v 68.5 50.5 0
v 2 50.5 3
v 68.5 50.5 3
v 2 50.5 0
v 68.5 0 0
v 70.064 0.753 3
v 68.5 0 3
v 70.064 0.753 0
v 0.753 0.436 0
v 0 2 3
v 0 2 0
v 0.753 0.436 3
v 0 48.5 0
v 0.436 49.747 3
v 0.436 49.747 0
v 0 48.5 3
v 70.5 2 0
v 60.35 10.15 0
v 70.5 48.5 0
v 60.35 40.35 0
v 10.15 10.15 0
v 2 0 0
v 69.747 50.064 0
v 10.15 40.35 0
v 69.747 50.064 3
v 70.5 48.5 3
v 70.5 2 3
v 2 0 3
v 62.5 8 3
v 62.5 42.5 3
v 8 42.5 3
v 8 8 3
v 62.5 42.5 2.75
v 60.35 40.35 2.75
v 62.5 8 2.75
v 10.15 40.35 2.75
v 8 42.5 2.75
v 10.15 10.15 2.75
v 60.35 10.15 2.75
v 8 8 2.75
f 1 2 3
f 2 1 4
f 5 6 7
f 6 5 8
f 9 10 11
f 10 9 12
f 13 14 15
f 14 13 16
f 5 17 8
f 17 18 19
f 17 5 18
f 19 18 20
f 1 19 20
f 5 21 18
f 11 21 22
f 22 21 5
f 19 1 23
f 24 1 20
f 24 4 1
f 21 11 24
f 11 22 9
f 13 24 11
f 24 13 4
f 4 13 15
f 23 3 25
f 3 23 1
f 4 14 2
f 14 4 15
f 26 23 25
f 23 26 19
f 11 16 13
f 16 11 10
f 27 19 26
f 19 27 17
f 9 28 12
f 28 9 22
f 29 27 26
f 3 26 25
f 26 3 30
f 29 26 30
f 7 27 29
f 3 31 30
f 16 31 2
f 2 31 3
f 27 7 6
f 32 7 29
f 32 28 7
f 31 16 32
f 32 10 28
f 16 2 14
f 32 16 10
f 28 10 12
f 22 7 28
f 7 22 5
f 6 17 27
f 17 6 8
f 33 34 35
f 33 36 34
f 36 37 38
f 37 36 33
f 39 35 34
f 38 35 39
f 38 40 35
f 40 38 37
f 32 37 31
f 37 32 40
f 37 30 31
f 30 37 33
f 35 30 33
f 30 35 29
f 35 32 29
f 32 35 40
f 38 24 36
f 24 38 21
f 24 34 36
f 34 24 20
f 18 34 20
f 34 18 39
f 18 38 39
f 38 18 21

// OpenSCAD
//
// PCB + Solder Stencil Mount
//
// Coordinate system:
//   X = width
//   Y = height
//   Z = height
//
// The PCB sits in a recessed pocket.
// The stencil sits above the PCB and is constrained by the outer frame.
//

// ============================================================
// PCB DIMENSIONS
// ============================================================

pcb_width  = 50.0;       // PCB X dimension
pcb_height = 30.0;       // PCB Y dimension
pcb_thickness = 1.6;


// ============================================================
// STENCIL DIMENSIONS
// ============================================================

// Actual stencil dimensions
stencil_width  = 54.0;
stencil_height = 34.0;
stencil_thickness = 0.15;


// ============================================================
// PCB POSITION RELATIVE TO STENCIL
// ============================================================

// Positive values move the PCB relative to the stencil.
//
// Example:
//   pcb_offset_x = 0
//   pcb_offset_y = 0
//
// centers the PCB inside the stencil.
//
// These are particularly useful if the stencil is intentionally
// larger than the PCB.

pcb_offset_x = 0.0;
pcb_offset_y = 0.0;


// ============================================================
// STENCIL CLEARANCE
// ============================================================

// Clearance between stencil and the inside of the retaining
// frame.
//
// Smaller = tighter stencil fit.
// Larger = easier insertion/removal.

stencil_clearance_x = 0.25;
stencil_clearance_y = 0.25;


// ============================================================
// FRAME
// ============================================================

// Width of material surrounding the stencil.

frame_border = 8.0;


// ============================================================
// PCB POCKET CLEARANCE
// ============================================================

// Clearance around PCB.
//
// Keep this small enough that the PCB cannot move significantly,
// but large enough for easy insertion.

pcb_clearance_x = 0.10;
pcb_clearance_y = 0.10;


// ============================================================
// Z HEIGHTS
// ============================================================

// Thickness of the mounting plate.

base_thickness = 3.0;


// Depth of PCB pocket measured from the top surface.
//
// For example, with a 3 mm base and a 1.6 mm PCB:
// pcb_pocket_depth = 1.8 means the PCB top is 1.2 mm
// below the top surface.

pcb_pocket_depth = 1.8;


// Depth of the stencil recess.
//
// This should normally be approximately equal to the stencil
// thickness, or slightly deeper.

stencil_pocket_depth = 0.25;


// ============================================================
// OPTIONAL PCB SUPPORT
// ============================================================

// Extra material underneath PCB.
//
// This effectively determines how deep the PCB sits.

pcb_bottom_support = 0.5;


// ============================================================
// CORNER / EDGE OPTIONS
// ============================================================

// Radius of outer frame corners.
// Set to 0 for square corners.

outer_corner_radius = 2;


// Radius of PCB pocket corners.
// Usually 0 is preferable for rectangular PCBs.

pcb_corner_radius = 0;


// ============================================================
// CALCULATED DIMENSIONS
// ============================================================

// Stencil opening/frame size
stencil_outer_width =
    stencil_width + 2 * stencil_clearance_x;

stencil_outer_height =
    stencil_height + 2 * stencil_clearance_y;


// Overall mount size
mount_width =
    stencil_outer_width + 2 * frame_border;

mount_height =
    stencil_outer_height + 2 * frame_border;


// PCB pocket dimensions
pcb_pocket_width =
    pcb_width + 2 * pcb_clearance_x;

pcb_pocket_height =
    pcb_height + 2 * pcb_clearance_y;


// PCB position in mount
//
// First center the stencil in the mount,
// then offset the PCB relative to the stencil.

pcb_center_x =
    mount_width / 2
    + pcb_offset_x;

pcb_center_y =
    mount_height / 2
    + pcb_offset_y;


// ============================================================
// HELPER: ROUNDED RECTANGLE
// ============================================================

module rounded_rectangle(width, height, radius) {

    if (radius <= 0) {
        square([width, height], center=true);
    }
    else {
        offset(r=radius)
            square([
                width - 2 * radius,
                height - 2 * radius
            ], center=true);
    }
}


// ============================================================
// MAIN MOUNT
// ============================================================

difference() {

    // --------------------------------------------------------
    // SOLID OUTER BODY
    // --------------------------------------------------------

    translate([
        mount_width / 2,
        mount_height / 2,
        0
    ])
    linear_extrude(height=base_thickness)
        rounded_rectangle(
            mount_width,
            mount_height,
            outer_corner_radius
        );


    // --------------------------------------------------------
    // STENCIL RECESS
    // --------------------------------------------------------
    //
    // This creates a shallow pocket corresponding to the
    // stencil dimensions.
    //
    // The stencil is constrained laterally by the remaining
    // frame.
    //

    translate([
        mount_width / 2,
        mount_height / 2,
        base_thickness - stencil_pocket_depth
    ])
    linear_extrude(
        height=stencil_pocket_depth + 0.1
    )
    square([
        stencil_outer_width,
        stencil_outer_height
    ], center=true);


    // --------------------------------------------------------
    // PCB POCKET
    // --------------------------------------------------------
    //
    // The PCB pocket is deeper than the stencil pocket.
    //

    translate([
        pcb_center_x,
        pcb_center_y,
        base_thickness - stencil_pocket_depth - pcb_pocket_depth - pcb_thickness
    ])
    linear_extrude(
        height=pcb_pocket_depth + pcb_thickness + 0.1
    )
    rounded_rectangle(
        pcb_pocket_width,
        pcb_pocket_height,
        pcb_corner_radius
    );
}
